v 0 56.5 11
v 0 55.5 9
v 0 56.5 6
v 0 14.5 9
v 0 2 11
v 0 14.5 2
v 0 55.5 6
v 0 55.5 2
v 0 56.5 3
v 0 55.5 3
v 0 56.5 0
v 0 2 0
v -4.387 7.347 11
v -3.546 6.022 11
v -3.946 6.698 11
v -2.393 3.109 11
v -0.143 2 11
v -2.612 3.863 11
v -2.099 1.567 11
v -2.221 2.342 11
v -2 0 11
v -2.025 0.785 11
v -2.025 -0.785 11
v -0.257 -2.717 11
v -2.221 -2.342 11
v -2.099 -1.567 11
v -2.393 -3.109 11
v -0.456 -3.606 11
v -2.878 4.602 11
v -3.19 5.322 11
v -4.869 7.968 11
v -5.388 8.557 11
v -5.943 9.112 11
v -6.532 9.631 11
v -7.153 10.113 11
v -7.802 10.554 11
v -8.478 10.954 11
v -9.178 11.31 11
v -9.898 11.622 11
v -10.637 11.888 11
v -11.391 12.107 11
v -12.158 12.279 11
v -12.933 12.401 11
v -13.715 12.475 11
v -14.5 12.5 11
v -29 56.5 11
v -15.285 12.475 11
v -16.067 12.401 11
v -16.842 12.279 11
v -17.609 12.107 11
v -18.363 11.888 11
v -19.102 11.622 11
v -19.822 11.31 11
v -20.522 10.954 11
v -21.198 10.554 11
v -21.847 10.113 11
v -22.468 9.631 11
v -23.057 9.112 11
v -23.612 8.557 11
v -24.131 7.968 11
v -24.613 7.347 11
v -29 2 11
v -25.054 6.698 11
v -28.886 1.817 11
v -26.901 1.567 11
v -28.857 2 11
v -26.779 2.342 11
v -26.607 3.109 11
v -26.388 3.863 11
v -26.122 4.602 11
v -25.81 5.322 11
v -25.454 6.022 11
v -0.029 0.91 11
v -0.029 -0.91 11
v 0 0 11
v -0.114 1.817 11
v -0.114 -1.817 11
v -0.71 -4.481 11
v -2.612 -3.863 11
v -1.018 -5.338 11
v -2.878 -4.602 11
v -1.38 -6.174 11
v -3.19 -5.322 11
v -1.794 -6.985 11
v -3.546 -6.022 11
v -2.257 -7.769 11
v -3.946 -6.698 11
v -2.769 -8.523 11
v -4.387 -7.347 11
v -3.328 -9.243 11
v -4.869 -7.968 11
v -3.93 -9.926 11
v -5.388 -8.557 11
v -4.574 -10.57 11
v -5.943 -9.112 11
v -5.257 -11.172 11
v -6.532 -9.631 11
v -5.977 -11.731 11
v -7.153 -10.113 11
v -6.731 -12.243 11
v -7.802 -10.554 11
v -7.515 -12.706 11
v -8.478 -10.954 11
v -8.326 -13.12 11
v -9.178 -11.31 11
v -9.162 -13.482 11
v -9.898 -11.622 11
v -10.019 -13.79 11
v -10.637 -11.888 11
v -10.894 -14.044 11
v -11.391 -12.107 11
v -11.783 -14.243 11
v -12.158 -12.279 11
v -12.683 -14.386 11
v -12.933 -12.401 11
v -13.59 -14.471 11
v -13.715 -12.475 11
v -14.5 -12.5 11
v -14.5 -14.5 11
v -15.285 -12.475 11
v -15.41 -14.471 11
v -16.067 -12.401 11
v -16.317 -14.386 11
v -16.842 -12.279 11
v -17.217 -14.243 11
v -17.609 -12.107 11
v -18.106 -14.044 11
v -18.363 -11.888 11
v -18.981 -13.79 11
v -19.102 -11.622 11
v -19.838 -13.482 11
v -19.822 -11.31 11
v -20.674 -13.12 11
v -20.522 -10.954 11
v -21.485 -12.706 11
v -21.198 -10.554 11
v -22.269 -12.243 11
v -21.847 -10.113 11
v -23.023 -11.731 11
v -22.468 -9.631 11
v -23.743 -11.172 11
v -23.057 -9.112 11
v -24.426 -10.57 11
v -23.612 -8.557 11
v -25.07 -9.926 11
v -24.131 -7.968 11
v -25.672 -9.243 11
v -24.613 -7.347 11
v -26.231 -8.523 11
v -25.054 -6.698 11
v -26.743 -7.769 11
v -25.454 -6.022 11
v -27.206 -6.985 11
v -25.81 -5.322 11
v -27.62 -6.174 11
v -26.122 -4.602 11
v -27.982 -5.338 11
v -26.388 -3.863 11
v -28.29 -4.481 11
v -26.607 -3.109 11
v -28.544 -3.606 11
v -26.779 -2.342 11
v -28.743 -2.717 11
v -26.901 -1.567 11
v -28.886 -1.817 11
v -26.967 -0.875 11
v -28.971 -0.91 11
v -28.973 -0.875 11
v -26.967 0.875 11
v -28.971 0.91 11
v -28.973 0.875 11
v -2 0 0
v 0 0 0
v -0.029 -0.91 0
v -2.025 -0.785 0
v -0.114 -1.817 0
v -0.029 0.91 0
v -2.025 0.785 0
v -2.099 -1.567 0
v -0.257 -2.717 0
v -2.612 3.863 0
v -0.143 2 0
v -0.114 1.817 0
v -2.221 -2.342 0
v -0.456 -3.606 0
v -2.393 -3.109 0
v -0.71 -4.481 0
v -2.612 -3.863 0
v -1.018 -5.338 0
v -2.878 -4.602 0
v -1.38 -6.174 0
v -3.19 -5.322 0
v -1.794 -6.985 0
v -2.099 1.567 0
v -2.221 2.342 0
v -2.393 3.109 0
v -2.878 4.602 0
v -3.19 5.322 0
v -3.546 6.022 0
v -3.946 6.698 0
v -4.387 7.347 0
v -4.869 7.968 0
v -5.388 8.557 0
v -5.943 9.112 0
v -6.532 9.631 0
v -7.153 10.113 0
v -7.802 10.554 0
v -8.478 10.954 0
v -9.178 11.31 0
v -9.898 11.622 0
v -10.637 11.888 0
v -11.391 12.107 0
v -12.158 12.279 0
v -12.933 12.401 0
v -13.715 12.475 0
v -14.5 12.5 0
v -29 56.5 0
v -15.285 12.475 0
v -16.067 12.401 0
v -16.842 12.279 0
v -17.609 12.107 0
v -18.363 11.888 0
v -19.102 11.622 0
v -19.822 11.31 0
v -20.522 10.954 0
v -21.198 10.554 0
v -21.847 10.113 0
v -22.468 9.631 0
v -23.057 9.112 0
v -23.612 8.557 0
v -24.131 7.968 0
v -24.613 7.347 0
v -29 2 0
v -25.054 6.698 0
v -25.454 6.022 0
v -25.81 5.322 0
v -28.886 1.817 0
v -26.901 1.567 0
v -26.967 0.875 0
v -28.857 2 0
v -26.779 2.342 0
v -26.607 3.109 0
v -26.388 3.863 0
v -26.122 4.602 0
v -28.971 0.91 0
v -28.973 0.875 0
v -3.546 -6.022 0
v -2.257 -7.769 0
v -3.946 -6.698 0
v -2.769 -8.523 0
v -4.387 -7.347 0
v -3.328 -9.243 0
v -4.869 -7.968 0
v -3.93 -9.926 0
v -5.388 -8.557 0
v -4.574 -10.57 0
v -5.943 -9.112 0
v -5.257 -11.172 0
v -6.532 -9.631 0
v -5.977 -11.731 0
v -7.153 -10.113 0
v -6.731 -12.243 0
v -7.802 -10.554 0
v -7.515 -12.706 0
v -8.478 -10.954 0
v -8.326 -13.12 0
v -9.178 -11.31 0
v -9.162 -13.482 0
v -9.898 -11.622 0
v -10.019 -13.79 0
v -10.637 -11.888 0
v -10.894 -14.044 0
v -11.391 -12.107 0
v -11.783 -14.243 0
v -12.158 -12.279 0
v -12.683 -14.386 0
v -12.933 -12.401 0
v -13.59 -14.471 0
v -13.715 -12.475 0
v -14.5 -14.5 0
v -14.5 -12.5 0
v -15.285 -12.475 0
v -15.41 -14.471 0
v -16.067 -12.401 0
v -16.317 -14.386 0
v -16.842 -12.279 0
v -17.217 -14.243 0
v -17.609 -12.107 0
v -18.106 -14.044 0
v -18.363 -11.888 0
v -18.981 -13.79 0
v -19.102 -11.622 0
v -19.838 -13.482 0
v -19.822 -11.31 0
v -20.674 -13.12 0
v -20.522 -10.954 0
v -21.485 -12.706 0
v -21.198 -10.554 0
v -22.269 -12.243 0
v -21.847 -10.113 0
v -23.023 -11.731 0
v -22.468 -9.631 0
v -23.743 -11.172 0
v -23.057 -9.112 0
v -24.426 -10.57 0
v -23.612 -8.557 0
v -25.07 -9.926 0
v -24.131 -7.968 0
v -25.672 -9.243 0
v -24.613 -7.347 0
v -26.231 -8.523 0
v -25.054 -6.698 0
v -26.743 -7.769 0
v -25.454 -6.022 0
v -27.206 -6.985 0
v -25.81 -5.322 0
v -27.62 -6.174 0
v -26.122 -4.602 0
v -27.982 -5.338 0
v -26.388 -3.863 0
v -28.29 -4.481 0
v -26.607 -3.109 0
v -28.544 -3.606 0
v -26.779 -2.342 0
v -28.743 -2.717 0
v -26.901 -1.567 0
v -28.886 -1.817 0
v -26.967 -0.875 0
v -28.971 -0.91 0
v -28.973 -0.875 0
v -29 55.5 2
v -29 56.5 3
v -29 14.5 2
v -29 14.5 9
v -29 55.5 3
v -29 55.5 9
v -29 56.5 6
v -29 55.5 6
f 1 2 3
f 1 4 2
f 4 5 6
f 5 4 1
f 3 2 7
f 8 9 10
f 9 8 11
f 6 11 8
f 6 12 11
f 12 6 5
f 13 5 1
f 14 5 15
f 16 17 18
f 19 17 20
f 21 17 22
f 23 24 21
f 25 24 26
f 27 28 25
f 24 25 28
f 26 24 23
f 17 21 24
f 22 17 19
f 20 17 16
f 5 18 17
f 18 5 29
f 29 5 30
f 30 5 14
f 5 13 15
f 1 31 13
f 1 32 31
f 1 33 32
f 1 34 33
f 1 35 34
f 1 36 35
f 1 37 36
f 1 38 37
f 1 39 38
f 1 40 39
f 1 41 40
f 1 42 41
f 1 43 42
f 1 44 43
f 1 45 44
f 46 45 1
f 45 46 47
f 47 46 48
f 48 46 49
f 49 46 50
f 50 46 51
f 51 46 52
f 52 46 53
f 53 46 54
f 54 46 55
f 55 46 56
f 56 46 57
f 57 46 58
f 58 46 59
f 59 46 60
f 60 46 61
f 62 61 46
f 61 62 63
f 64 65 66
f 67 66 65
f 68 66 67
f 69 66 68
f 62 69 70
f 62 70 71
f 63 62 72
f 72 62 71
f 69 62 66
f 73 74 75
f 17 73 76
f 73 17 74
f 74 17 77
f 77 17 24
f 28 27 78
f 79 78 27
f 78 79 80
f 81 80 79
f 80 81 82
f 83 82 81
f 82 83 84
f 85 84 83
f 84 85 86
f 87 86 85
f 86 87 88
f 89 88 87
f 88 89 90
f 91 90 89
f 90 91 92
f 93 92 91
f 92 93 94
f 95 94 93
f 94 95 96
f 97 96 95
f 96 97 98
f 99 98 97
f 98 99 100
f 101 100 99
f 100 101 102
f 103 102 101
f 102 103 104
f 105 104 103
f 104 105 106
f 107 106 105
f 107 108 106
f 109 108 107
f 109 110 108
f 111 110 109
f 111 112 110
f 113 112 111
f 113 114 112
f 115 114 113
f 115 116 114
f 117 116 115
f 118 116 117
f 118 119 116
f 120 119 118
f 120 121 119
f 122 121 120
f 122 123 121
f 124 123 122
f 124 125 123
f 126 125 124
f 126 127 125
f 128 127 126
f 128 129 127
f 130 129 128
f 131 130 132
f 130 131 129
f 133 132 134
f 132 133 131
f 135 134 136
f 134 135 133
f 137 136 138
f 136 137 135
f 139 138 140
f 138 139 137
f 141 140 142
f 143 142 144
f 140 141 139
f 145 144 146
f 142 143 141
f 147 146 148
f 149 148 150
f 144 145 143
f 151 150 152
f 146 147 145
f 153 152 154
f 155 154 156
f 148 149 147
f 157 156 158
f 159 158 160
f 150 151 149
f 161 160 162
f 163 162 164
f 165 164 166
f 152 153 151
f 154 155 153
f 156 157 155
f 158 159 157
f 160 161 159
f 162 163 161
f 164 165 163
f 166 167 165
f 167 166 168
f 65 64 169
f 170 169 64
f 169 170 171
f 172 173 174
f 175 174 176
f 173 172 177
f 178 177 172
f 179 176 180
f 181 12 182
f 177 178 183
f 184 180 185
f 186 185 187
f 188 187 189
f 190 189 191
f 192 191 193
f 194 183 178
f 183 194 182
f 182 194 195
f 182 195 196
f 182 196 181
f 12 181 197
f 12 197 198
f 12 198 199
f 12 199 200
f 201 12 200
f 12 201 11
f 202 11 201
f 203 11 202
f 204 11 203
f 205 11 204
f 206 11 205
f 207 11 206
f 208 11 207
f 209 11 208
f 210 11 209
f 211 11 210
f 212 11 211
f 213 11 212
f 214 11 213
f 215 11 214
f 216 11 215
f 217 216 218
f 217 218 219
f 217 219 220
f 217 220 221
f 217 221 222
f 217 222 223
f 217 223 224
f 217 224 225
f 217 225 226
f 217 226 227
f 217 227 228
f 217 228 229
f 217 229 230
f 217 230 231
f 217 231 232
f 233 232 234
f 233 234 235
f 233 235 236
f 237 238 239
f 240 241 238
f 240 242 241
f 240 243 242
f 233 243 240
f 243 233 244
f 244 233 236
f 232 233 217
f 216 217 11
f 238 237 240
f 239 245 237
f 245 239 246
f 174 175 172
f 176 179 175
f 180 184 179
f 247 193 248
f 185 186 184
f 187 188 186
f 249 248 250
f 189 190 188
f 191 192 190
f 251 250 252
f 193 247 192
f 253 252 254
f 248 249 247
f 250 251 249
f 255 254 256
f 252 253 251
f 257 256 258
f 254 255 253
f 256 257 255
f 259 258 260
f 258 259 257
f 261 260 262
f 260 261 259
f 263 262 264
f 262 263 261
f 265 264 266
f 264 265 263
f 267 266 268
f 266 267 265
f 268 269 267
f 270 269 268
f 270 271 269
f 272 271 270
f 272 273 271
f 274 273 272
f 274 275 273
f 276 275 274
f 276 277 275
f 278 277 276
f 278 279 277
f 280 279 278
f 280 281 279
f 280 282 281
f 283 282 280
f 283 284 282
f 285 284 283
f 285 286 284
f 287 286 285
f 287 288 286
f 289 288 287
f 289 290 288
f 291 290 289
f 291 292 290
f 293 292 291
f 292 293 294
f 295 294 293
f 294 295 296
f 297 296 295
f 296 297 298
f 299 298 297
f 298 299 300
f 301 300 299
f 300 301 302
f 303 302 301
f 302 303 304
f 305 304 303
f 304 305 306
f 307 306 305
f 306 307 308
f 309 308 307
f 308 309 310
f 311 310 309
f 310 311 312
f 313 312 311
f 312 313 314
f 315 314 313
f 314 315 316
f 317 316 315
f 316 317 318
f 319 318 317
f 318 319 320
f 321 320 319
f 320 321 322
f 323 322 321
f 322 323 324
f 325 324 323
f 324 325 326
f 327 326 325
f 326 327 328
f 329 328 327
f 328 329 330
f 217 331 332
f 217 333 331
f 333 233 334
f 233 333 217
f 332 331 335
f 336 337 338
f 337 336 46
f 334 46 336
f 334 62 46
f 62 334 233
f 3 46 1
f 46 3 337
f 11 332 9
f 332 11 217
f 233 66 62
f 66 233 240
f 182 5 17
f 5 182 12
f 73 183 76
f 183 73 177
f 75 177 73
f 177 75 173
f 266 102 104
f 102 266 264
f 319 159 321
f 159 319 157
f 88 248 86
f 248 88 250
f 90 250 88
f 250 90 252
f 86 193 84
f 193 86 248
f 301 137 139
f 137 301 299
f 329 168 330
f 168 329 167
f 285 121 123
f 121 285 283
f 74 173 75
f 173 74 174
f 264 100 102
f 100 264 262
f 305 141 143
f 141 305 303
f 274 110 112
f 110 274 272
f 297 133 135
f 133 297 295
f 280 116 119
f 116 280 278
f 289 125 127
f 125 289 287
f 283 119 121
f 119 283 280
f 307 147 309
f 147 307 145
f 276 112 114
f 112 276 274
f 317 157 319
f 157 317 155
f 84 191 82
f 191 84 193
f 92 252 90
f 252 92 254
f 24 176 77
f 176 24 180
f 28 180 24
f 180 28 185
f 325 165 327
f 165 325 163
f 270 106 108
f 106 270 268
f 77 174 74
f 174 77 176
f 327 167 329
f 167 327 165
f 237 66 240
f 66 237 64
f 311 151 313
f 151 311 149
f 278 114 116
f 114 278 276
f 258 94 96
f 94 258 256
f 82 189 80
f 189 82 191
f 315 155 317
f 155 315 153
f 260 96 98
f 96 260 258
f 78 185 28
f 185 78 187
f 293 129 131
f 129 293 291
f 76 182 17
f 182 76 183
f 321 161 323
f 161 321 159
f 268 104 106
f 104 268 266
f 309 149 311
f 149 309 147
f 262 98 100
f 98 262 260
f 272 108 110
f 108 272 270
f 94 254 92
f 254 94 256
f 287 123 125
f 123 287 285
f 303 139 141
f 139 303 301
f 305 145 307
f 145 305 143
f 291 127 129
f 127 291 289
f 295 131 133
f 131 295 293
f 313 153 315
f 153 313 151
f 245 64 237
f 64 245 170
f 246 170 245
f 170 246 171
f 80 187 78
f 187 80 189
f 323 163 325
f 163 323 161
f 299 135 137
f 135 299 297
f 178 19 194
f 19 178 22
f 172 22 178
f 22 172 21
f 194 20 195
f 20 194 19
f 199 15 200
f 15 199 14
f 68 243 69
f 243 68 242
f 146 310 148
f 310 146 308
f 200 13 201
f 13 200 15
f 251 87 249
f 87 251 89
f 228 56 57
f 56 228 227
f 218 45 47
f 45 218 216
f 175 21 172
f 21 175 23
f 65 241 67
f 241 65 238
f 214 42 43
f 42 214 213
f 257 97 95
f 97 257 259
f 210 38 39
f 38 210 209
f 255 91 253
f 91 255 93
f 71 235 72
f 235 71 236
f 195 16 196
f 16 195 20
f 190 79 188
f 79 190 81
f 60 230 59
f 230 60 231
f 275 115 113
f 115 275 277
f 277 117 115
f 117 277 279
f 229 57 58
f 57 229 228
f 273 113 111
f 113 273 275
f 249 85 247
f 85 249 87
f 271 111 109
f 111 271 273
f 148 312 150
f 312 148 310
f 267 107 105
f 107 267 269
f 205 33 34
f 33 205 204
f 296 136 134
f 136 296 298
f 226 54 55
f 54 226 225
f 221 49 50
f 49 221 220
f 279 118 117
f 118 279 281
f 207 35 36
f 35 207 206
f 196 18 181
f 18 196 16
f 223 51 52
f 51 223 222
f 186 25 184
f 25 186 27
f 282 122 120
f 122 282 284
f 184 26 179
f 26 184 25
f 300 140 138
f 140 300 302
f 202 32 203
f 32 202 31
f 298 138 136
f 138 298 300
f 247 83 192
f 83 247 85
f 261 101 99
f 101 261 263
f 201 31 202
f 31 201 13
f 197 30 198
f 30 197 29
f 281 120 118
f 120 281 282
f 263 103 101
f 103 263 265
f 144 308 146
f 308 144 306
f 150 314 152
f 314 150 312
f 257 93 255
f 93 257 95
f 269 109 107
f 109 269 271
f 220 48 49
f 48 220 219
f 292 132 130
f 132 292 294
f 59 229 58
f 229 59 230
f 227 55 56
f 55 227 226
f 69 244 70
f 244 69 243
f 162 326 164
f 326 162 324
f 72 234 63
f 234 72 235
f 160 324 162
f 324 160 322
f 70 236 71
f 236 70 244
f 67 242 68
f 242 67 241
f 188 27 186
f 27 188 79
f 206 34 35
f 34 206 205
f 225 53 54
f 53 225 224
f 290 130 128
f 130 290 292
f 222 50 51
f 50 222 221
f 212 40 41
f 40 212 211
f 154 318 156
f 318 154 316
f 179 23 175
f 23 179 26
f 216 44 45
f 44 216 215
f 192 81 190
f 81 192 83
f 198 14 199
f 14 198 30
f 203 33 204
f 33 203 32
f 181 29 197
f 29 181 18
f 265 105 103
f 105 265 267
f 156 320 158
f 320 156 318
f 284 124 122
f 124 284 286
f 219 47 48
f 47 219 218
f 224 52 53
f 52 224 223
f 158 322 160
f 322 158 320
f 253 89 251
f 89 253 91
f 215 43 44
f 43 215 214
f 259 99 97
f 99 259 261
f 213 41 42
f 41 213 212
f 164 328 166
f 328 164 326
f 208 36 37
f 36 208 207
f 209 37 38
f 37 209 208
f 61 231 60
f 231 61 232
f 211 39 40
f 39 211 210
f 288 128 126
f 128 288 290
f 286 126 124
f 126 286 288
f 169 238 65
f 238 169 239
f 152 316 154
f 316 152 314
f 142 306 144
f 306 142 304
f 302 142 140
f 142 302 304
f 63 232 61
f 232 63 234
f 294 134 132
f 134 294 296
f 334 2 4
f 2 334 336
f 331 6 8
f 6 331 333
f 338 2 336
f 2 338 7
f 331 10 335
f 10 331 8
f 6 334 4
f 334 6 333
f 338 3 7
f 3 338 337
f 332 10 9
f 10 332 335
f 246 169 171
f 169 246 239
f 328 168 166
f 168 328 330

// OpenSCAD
/* [Dimensions] */

//Clamp length
l=40;
//Clamp height
h=7;
//Clamp width
w=25;
//Default thickness
thck=2;
//Filament thickness
ft=1.75;
//Smoothness
$fn=100;

module fillament_clip(l=l, h=h, w=w, thck=thck, ft=ft) {
   // rotate([0,90,0])
	translate([-w/2-thck,0,thck]) {
	difference() {
		union() {
			translate([-w/2-thck,thck,-thck])
				cube([w+2*thck,l+w/2+thck,h+2*thck]);

			translate([0,0,-thck])
				cylinder(r=w/2+thck, h=h+2*thck);
		}

		union() {
			translate([0,0,-thck-1])
				cylinder(r=w/2, h=h+2*thck+2);

			translate([-w/2-thck-1,w/2+thck,0])
				cube([w+2*thck+2,l+1,h]);

			translate([-w/2-thck-1,l+w/2+thck-1,thck-1])
				cube([w+2*thck+2,thck+2,h-2*thck]);

			translate([-w/2-thck-1,-ft/2,-thck-1])
				cube([thck+2,ft,h+2*thck+2]);
		}
	}

    }
}



fillament_clip();
